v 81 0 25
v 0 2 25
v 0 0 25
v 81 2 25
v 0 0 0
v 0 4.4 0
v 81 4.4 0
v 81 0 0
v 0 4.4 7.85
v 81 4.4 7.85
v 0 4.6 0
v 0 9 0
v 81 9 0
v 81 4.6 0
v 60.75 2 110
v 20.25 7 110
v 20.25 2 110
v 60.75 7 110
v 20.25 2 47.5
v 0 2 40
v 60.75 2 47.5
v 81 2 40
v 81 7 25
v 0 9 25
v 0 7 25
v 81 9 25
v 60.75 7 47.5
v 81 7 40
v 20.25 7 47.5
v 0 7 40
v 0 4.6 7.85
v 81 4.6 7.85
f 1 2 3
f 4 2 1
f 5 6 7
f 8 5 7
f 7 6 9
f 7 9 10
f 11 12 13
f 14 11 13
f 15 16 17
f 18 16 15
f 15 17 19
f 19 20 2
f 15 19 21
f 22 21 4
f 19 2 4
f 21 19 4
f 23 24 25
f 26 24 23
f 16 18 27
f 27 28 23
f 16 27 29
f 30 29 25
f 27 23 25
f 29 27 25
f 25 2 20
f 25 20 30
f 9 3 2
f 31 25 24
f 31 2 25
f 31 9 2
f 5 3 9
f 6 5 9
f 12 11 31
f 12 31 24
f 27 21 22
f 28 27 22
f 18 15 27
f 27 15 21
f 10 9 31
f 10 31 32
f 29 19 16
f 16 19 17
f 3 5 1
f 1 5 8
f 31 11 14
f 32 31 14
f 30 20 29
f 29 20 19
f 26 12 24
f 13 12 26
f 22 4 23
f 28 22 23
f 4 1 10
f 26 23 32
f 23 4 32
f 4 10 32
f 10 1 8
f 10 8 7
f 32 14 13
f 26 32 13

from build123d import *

# Parameters (mm, degrees)
F0_W     = 81
F0_H     = 9
F1_DEPTH = 25
F2_W     = 81
F2_H     = 0.2
F3_DEPTH = 7.85
F4_W     = 40.5
F4_H     = 2.5
F5_DEPTH = 85
F7_DEPTH = 25


with BuildPart() as f1:
    # F0 (on Top) → F1 (new body)
    with BuildSketch(Plane.XY):
        with Locations((40.5, 4.5)):
            Rectangle(F0_W, F0_H)
    extrude(amount=F1_DEPTH)

    # F2 (on face) → F3 (cut)
    with BuildSketch(Plane(origin=(0, 0, 0), x_dir=(1, 0, 0), z_dir=(0, 0, -1))):
        with Locations((40.5, -4.5)):
            Rectangle(F2_W, F2_H)
    extrude(amount=-F3_DEPTH, mode=Mode.SUBTRACT)

    # F4 (on face) → F5 (join)
    with BuildSketch(Plane.XY.offset(25)):
        with Locations((20.25, 5.75)):
            Rectangle(F4_W, F4_H)
        with Locations((20.25, 3.25)):
            Rectangle(F4_W, F4_H)
        with Locations((60.75, 3.25)):
            Rectangle(F4_W, F4_H)
        with Locations((60.75, 5.75)):
            Rectangle(F4_W, F4_H)
    extrude(amount=F5_DEPTH)

    # F6 (on face) → F7 (cut)
    with BuildSketch(Plane.XZ.offset(-2)):
        Polygon((0, 110), (0, 40), (20.25, 47.5), (20.25, 110), align=None)
        Polygon((60.75, 47.5), (81, 40), (81, 110), (60.75, 110), align=None)
    extrude(amount=-F7_DEPTH, mode=Mode.SUBTRACT)


solid = f1.part
